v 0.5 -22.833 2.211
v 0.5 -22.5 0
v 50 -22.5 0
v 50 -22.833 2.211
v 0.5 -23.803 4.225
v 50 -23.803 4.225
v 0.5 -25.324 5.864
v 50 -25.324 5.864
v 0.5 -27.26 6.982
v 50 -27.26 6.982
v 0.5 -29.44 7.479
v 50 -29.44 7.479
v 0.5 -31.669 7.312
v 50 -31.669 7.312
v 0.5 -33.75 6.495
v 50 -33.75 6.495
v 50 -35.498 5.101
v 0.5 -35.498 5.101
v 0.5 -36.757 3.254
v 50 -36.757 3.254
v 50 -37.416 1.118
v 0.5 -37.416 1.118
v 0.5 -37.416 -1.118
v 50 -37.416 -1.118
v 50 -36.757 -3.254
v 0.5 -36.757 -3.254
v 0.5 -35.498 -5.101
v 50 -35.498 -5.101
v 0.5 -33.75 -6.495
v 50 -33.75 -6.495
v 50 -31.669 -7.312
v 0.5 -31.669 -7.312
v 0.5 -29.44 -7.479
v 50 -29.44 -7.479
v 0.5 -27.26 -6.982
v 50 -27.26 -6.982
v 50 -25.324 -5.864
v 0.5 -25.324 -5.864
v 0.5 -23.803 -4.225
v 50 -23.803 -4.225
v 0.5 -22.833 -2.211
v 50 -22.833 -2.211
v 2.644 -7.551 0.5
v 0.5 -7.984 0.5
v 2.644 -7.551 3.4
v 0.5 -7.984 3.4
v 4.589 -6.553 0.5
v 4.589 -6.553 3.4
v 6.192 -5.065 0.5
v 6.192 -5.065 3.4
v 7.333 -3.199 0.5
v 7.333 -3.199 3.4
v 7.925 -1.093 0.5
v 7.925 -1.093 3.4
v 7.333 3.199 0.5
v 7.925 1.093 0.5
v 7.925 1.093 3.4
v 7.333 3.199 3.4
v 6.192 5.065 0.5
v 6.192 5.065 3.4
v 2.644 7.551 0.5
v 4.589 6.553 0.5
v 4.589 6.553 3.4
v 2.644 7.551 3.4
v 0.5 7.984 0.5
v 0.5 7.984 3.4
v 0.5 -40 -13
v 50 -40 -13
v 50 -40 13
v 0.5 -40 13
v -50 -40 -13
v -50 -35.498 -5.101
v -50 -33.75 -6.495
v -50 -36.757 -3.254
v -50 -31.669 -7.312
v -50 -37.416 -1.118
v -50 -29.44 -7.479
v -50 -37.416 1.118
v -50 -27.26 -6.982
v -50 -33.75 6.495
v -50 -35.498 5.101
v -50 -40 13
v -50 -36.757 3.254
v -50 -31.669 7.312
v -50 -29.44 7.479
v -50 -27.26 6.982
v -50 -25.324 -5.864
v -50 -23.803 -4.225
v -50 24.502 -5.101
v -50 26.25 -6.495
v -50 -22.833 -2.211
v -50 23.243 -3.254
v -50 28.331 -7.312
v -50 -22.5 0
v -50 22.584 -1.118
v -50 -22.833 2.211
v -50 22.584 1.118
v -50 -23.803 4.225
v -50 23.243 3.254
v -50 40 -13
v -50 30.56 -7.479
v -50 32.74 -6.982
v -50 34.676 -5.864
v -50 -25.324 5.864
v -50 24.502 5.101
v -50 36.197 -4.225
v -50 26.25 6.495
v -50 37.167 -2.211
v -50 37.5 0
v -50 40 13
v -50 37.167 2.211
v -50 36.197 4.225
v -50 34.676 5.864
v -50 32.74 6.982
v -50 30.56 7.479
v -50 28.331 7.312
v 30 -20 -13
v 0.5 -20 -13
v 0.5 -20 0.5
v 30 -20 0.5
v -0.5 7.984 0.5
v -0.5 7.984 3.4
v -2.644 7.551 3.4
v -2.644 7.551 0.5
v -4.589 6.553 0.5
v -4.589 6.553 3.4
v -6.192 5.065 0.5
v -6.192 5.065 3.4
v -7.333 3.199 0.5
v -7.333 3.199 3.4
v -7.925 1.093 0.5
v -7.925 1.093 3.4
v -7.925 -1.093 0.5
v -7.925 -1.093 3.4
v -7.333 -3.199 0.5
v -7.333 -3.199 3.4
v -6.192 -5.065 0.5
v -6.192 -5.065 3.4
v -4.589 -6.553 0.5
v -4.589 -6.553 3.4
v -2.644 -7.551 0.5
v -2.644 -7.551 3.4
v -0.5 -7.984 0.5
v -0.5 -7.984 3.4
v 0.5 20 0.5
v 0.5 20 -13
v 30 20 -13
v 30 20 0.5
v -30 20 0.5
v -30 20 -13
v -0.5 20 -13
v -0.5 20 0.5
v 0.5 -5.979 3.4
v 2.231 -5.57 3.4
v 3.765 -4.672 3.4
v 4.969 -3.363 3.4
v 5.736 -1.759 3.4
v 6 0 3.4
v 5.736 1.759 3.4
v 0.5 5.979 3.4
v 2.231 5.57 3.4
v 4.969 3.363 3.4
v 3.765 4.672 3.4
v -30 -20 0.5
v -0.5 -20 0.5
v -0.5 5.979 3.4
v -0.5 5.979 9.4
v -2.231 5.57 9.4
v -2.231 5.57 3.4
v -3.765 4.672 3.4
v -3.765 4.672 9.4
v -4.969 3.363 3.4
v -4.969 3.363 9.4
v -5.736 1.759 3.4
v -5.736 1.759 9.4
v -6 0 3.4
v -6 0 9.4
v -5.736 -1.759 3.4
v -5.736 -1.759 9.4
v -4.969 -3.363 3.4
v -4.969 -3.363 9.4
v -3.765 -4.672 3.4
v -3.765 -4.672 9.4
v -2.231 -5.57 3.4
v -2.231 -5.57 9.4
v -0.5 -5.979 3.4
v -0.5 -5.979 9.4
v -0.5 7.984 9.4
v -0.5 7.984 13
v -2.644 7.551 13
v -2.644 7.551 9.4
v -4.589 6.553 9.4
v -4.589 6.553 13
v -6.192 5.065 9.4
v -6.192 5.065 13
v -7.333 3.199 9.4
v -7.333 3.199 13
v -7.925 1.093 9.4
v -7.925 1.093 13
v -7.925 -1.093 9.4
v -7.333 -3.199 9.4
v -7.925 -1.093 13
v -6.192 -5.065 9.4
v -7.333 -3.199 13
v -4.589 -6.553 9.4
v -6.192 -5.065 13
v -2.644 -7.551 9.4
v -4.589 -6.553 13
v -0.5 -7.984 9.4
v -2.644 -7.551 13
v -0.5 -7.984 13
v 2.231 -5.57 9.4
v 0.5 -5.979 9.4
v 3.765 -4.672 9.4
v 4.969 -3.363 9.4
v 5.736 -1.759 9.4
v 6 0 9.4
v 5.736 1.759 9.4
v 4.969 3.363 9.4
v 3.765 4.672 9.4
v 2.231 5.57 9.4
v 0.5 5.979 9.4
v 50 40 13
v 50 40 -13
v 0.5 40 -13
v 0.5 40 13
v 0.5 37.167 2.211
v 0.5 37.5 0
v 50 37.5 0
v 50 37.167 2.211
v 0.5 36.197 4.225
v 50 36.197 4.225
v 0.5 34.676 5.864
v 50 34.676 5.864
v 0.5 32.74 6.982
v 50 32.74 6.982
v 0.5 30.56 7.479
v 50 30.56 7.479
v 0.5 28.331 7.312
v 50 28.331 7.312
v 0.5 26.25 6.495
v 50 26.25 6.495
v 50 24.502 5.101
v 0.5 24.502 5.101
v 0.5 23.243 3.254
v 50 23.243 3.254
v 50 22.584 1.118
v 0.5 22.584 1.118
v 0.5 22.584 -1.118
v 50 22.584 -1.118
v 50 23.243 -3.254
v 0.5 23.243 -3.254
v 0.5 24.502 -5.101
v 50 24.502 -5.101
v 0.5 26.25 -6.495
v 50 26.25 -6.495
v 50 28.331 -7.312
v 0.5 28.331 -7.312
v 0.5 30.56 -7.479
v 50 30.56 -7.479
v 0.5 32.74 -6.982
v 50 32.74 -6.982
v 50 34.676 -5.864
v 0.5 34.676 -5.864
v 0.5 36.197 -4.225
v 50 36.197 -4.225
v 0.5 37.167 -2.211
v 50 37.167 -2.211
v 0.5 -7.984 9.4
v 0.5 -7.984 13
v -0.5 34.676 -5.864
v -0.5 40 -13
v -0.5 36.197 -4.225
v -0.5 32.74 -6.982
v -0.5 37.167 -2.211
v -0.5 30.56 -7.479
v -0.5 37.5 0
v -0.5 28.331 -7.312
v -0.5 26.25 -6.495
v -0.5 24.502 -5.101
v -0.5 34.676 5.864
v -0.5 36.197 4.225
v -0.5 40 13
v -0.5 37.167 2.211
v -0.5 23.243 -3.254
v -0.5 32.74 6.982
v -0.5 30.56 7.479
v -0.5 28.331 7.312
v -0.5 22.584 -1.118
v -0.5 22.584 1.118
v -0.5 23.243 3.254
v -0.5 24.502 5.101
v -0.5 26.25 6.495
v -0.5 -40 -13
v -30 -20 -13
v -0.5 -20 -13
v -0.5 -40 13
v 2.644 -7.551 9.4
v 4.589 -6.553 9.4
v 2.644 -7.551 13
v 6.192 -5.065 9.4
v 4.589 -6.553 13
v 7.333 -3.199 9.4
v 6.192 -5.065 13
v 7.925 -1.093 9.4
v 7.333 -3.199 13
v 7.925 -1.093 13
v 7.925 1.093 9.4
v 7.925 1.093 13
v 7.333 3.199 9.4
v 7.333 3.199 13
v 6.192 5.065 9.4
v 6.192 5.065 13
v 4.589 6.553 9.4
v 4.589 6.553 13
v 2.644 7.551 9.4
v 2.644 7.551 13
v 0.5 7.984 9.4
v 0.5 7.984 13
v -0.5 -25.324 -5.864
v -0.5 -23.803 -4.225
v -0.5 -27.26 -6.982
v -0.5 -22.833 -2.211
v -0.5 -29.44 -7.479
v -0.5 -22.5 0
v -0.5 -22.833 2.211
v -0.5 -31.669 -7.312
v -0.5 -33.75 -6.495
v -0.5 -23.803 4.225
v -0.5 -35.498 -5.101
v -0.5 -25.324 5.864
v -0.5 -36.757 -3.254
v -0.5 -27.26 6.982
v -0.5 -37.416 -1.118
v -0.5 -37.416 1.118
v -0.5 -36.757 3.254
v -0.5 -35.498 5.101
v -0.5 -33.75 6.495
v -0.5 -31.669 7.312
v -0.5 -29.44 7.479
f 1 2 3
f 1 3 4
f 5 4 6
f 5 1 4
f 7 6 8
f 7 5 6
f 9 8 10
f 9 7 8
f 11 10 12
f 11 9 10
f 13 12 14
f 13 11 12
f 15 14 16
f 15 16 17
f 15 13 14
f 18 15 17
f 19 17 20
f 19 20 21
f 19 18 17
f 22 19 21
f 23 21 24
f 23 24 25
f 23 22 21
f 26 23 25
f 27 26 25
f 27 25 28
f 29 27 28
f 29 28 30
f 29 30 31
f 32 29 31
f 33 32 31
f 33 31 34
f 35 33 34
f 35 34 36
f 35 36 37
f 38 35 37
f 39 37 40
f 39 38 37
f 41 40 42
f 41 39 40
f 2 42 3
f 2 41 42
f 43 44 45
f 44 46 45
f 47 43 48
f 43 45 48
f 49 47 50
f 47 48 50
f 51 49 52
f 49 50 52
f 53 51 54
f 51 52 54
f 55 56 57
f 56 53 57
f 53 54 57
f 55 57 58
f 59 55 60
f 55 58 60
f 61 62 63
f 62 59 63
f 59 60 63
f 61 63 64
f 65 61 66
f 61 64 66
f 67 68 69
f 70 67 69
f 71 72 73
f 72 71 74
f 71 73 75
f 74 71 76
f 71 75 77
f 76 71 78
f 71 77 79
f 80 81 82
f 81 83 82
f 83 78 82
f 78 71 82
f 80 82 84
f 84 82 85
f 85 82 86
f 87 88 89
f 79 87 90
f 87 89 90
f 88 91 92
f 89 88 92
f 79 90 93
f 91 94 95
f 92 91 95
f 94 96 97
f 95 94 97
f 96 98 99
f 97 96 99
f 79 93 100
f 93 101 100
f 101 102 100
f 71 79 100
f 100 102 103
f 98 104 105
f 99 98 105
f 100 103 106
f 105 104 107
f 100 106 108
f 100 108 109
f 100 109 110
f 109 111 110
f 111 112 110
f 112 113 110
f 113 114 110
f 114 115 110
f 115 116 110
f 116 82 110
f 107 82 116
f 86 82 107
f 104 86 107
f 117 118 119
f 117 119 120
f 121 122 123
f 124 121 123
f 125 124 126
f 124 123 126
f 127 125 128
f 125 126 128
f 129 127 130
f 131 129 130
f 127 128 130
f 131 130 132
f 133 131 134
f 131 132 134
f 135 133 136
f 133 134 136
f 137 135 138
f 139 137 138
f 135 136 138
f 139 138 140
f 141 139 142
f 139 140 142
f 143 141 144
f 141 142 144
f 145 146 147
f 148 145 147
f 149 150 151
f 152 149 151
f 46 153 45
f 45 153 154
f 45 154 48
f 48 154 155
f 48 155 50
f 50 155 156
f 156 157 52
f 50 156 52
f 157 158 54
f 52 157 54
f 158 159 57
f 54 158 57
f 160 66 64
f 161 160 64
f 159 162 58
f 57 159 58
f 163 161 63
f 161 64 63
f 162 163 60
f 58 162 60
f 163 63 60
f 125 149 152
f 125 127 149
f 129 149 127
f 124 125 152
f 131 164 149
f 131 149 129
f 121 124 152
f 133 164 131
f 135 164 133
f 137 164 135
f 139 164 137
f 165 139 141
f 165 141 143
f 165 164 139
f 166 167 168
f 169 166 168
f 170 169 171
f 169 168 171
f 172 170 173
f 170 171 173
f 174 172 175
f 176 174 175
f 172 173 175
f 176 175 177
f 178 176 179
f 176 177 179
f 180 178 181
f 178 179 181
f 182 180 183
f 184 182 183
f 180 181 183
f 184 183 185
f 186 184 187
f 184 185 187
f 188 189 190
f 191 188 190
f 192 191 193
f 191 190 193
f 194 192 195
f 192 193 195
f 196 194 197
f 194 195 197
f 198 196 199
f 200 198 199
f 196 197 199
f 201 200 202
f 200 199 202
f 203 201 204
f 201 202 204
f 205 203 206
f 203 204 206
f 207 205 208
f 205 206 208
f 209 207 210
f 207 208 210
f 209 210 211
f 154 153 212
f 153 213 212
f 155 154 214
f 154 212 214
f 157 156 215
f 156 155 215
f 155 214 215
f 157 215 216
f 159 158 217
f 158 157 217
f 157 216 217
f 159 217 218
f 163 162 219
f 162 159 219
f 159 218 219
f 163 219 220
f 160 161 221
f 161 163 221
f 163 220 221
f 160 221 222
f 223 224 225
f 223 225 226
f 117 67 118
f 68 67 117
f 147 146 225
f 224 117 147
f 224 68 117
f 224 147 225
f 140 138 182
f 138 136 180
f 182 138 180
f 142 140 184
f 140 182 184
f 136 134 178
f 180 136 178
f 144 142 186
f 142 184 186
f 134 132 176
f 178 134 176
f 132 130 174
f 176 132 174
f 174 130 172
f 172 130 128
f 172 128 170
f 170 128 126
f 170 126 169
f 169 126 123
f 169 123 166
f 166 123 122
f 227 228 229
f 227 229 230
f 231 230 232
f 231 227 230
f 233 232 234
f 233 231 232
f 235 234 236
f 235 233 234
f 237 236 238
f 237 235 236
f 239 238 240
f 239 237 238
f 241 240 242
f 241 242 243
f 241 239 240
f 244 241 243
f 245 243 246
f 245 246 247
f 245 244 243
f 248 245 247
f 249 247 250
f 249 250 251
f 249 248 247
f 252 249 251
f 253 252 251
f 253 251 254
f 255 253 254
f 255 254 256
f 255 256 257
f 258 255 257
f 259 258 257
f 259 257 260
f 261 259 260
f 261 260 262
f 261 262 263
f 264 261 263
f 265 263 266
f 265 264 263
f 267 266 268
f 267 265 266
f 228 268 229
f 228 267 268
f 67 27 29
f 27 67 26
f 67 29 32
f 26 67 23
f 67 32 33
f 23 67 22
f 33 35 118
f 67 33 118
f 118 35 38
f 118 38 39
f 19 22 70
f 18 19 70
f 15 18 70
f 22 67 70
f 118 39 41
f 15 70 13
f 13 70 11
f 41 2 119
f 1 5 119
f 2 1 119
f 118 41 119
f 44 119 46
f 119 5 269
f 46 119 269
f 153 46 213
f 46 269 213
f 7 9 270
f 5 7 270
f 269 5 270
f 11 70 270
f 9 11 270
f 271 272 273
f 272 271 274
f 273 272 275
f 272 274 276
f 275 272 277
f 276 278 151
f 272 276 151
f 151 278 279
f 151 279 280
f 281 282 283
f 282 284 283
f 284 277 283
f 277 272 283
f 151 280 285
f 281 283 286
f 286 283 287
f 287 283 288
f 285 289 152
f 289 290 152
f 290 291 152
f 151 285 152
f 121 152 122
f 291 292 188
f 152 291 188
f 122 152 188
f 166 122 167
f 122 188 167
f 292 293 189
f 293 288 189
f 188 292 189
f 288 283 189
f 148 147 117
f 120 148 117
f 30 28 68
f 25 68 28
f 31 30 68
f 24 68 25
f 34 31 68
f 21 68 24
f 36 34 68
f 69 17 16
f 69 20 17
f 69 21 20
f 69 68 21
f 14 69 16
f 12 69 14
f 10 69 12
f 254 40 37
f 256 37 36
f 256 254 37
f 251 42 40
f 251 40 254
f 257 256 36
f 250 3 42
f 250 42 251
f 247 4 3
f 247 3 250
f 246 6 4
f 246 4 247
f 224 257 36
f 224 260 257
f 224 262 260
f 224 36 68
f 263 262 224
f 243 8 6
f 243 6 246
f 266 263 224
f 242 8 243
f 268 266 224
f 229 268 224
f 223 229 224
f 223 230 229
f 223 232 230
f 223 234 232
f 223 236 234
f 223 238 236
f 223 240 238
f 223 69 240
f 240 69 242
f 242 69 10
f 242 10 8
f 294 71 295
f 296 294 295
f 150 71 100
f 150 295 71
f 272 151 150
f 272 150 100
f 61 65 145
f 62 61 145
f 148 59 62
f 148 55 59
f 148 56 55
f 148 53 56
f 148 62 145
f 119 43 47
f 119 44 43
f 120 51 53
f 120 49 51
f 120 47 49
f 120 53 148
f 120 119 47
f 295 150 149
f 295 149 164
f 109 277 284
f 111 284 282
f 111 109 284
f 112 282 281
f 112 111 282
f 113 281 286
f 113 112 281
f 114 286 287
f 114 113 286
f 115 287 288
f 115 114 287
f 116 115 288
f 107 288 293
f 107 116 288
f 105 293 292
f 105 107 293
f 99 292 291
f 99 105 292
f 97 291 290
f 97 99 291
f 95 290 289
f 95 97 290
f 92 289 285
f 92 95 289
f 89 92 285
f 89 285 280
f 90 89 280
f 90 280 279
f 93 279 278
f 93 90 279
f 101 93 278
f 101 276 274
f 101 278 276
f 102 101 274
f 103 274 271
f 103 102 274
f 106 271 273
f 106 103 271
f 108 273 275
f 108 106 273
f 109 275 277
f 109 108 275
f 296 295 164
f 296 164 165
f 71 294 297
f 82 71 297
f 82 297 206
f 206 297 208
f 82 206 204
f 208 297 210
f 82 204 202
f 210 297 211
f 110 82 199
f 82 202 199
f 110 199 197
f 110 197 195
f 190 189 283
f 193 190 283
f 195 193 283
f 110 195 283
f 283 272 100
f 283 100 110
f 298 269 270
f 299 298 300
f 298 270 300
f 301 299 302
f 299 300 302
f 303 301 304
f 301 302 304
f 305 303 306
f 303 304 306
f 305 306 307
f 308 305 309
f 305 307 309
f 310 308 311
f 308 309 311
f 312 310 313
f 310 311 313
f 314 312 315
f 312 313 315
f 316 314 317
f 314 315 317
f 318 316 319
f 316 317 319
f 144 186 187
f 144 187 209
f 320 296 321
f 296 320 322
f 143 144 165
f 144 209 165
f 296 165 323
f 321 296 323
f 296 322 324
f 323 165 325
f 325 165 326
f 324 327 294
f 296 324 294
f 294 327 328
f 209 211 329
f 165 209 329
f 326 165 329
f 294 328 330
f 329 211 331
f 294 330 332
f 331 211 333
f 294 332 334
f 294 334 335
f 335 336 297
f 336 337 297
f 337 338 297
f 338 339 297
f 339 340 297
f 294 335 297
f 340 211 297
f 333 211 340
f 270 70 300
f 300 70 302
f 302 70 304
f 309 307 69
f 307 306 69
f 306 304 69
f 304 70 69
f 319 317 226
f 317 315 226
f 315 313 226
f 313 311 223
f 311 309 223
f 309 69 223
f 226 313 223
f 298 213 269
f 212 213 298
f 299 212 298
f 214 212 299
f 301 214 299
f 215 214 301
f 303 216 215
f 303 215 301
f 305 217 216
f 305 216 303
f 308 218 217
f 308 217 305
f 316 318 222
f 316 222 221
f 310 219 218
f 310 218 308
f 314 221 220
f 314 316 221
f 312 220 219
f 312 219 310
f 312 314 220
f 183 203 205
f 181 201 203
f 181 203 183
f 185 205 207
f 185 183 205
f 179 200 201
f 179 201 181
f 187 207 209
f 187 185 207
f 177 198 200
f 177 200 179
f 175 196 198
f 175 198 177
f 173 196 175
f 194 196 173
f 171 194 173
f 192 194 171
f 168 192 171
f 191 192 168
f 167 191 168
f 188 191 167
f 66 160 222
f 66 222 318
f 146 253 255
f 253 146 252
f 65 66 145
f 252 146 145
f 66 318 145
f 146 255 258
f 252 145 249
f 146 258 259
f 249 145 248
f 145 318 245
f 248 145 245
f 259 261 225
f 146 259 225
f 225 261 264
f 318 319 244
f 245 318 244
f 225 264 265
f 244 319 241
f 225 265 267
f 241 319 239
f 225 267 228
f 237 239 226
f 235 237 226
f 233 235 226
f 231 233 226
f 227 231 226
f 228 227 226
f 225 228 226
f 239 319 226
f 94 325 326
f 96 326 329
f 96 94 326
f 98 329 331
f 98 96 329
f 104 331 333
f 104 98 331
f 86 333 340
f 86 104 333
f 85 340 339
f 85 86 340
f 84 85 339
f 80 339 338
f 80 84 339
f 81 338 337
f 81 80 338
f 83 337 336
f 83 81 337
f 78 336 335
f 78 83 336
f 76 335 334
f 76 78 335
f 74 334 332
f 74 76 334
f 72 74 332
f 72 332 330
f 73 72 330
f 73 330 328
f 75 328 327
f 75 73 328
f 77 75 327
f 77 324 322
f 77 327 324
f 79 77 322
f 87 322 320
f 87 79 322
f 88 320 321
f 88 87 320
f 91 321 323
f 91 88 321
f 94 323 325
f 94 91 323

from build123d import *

# Parameters (mm, degrees)
F0_W      = 80
F0_H      = 26
F0_R      = 7.5
F1_DEPTH  = 50
F2_R      = 8
F3_DEPTH  = 3.6
F4_R      = 6
F5_DEPTH  = 6
F6_R      = 8
F7_DEPTH  = 2.9
F8_W      = 60
F8_H      = 40
F9_DEPTH  = 13.5
F11_DEPTH = 26


with BuildPart() as f1:
    # F0 (on Right) → F1 (new body, symmetric)
    with BuildSketch(Plane.YZ):
        Rectangle(F0_W, F0_H)
        with Locations((-30, 0)):
            Circle(F0_R, mode=Mode.SUBTRACT)
        with Locations((30, 0)):
            Circle(F0_R, mode=Mode.SUBTRACT)
    extrude(amount=F1_DEPTH, both=True)

    # F2 (on face) → F3 (cut)
    with BuildSketch(Plane.XY.offset(13)):
        Circle(F2_R)
    extrude(amount=-F3_DEPTH, mode=Mode.SUBTRACT)

    # F4 (on face) → F5 (cut)
    with BuildSketch(Plane.XY.offset(9.4)):
        Circle(F4_R)
    extrude(amount=-F5_DEPTH, mode=Mode.SUBTRACT)

    # F6 (on face) → F7 (cut)
    with BuildSketch(Plane.XY.offset(3.4)):
        Circle(F6_R)
    extrude(amount=-F7_DEPTH, mode=Mode.SUBTRACT)

    # F8 (on face) → F9 (cut, through all)
    with BuildSketch(Plane(origin=(0, 0, -13), x_dir=(1, 0, 0), z_dir=(0, 0, -1))):
        Rectangle(F8_W, F8_H)
    extrude(amount=-F9_DEPTH, mode=Mode.SUBTRACT)

    # F10 (on face) → F11 (cut, through all)
    with BuildSketch(Plane.XY.offset(13)):
        with BuildLine():
            Line((-0.5, -40), (0.5, -40))
            Line((0.5, -40), (0.5, -7.9843597113))
            ThreePointArc((0.5, -7.9843597113), (0, -8), (-0.5, -7.9843597113))
            Line((-0.5, -7.9843597113), (-0.5, -40))
        make_face()
        with BuildLine():
            ThreePointArc((-0.5, -7.9843597113), (0, -8), (0.5, -7.9843597113))
            Line((0.5, -7.9843597113), (0.5, 7.9843597113))
            ThreePointArc((0.5, 7.9843597113), (0, 8), (-0.5, 7.9843597113))
            Line((-0.5, 7.9843597113), (-0.5, -7.9843597113))
        make_face()
        with BuildLine():
            ThreePointArc((-0.5, 7.9843597113), (0, 8), (0.5, 7.9843597113))
            Line((0.5, 7.9843597113), (0.5, 40))
            Line((0.5, 40), (-0.5, 40))
            Line((-0.5, 40), (-0.5, 7.9843597113))
        make_face()
    extrude(amount=-F11_DEPTH, mode=Mode.SUBTRACT)


solid = f1.part
